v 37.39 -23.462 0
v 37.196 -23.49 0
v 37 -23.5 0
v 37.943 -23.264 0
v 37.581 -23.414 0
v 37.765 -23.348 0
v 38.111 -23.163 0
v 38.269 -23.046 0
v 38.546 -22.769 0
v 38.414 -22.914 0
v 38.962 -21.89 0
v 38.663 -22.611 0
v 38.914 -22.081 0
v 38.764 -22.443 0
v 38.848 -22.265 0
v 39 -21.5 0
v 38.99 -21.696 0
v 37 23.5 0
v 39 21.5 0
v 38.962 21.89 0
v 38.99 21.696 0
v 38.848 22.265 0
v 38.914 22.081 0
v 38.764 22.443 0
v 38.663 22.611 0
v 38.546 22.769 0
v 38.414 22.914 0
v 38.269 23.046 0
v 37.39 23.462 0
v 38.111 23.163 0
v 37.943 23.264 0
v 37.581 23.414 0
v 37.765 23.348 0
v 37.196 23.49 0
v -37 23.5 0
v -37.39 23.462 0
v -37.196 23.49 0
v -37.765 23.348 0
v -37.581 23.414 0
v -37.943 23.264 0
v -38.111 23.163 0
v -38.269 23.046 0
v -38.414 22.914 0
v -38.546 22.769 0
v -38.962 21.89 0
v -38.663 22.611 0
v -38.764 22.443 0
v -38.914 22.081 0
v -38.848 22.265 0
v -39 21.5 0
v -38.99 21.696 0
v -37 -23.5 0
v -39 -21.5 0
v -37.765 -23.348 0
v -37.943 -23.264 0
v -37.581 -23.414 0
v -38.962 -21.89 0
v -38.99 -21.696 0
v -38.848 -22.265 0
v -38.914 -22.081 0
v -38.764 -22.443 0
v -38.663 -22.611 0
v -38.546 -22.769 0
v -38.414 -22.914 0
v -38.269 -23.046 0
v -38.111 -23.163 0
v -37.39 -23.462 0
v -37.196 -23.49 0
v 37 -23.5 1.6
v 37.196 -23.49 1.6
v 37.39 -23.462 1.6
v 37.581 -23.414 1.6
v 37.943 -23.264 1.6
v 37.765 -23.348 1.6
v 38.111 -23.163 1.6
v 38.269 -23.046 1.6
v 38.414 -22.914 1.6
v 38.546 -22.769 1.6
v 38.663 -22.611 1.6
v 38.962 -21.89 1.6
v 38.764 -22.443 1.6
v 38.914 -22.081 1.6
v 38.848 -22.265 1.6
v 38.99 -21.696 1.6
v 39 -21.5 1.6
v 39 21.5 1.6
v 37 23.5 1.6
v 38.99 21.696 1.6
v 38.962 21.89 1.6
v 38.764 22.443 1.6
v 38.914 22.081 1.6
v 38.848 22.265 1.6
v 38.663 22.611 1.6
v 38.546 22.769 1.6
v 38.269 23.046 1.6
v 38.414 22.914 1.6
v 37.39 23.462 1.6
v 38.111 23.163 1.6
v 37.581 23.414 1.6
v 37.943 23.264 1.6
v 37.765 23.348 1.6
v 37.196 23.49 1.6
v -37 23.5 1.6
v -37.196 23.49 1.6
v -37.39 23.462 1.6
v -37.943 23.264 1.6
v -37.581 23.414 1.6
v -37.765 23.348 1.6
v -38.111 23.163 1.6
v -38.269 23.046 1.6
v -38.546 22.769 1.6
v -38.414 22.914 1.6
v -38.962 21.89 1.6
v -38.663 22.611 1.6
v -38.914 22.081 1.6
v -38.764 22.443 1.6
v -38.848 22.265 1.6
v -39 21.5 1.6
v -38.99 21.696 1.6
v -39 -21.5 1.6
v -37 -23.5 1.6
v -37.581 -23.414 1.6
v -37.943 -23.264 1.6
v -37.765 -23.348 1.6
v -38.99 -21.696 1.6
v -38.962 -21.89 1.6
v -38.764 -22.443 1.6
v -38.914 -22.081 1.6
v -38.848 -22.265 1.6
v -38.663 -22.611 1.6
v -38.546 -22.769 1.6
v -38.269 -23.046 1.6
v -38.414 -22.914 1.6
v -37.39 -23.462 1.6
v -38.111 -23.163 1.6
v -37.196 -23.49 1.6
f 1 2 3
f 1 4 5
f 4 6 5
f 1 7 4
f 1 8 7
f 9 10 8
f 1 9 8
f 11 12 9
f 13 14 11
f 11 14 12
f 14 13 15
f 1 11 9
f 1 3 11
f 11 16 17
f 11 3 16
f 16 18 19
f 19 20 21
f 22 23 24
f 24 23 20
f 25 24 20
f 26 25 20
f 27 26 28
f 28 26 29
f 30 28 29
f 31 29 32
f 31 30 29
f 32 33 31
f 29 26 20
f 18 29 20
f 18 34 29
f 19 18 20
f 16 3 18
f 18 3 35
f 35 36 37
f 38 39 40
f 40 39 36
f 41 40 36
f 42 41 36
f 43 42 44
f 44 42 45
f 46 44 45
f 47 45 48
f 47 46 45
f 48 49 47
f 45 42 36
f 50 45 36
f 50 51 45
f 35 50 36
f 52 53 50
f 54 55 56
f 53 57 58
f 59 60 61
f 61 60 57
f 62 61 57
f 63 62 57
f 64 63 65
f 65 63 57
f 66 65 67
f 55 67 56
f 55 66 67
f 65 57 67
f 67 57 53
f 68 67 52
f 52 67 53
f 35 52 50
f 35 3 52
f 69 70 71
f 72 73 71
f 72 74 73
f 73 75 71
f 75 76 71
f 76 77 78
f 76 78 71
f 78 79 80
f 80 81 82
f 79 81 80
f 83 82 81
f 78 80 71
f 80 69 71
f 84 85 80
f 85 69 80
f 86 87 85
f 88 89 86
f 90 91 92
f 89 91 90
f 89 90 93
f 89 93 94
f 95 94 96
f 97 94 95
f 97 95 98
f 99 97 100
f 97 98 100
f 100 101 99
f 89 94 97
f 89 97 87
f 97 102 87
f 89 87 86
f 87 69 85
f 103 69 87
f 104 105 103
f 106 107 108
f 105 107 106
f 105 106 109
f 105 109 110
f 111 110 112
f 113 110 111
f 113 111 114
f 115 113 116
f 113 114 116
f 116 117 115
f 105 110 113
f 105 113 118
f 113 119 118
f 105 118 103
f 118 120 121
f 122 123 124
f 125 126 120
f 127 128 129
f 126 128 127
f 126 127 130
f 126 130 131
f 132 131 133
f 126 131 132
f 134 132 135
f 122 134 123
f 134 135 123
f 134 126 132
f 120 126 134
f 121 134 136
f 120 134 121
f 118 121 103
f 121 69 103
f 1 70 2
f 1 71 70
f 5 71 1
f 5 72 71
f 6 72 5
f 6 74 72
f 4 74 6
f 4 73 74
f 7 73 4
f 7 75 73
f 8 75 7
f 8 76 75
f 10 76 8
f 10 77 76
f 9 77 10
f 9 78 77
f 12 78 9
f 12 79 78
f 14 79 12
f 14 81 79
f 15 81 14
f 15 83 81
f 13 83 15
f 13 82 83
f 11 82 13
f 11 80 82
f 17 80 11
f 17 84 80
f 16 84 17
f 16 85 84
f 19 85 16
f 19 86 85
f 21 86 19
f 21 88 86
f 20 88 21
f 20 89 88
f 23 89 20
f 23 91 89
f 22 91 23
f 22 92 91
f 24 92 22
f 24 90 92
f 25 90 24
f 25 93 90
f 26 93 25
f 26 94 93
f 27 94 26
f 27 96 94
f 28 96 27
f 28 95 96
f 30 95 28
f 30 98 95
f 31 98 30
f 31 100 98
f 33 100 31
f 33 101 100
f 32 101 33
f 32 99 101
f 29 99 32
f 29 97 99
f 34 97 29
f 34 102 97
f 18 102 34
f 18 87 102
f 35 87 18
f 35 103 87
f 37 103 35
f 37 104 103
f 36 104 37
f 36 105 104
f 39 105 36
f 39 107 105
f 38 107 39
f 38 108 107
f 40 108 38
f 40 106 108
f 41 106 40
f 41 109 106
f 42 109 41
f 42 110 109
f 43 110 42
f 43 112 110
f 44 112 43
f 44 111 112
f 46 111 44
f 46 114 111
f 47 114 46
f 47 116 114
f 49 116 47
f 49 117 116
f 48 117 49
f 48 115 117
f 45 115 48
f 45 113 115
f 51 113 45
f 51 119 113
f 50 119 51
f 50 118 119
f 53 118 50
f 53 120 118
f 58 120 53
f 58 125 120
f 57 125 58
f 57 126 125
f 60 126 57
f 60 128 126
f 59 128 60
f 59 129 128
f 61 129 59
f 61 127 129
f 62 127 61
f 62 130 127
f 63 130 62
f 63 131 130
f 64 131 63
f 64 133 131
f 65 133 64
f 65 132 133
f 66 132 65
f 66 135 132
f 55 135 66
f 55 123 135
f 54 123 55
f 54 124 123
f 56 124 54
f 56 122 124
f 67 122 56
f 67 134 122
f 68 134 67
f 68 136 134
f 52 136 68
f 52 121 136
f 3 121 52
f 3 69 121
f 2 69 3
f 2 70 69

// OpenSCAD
$fn=64;

module dcdc_power_converter_module(
    length=78.0,
    width=47.0,
    thickness=1.6,
    corner_radius=2.0
){
    // PCB with rounded corners
    linear_extrude(height=thickness)
        offset(r=corner_radius)
            square([length-2*corner_radius, width-2*corner_radius], center=true);
}

dcdc_power_converter_module();
